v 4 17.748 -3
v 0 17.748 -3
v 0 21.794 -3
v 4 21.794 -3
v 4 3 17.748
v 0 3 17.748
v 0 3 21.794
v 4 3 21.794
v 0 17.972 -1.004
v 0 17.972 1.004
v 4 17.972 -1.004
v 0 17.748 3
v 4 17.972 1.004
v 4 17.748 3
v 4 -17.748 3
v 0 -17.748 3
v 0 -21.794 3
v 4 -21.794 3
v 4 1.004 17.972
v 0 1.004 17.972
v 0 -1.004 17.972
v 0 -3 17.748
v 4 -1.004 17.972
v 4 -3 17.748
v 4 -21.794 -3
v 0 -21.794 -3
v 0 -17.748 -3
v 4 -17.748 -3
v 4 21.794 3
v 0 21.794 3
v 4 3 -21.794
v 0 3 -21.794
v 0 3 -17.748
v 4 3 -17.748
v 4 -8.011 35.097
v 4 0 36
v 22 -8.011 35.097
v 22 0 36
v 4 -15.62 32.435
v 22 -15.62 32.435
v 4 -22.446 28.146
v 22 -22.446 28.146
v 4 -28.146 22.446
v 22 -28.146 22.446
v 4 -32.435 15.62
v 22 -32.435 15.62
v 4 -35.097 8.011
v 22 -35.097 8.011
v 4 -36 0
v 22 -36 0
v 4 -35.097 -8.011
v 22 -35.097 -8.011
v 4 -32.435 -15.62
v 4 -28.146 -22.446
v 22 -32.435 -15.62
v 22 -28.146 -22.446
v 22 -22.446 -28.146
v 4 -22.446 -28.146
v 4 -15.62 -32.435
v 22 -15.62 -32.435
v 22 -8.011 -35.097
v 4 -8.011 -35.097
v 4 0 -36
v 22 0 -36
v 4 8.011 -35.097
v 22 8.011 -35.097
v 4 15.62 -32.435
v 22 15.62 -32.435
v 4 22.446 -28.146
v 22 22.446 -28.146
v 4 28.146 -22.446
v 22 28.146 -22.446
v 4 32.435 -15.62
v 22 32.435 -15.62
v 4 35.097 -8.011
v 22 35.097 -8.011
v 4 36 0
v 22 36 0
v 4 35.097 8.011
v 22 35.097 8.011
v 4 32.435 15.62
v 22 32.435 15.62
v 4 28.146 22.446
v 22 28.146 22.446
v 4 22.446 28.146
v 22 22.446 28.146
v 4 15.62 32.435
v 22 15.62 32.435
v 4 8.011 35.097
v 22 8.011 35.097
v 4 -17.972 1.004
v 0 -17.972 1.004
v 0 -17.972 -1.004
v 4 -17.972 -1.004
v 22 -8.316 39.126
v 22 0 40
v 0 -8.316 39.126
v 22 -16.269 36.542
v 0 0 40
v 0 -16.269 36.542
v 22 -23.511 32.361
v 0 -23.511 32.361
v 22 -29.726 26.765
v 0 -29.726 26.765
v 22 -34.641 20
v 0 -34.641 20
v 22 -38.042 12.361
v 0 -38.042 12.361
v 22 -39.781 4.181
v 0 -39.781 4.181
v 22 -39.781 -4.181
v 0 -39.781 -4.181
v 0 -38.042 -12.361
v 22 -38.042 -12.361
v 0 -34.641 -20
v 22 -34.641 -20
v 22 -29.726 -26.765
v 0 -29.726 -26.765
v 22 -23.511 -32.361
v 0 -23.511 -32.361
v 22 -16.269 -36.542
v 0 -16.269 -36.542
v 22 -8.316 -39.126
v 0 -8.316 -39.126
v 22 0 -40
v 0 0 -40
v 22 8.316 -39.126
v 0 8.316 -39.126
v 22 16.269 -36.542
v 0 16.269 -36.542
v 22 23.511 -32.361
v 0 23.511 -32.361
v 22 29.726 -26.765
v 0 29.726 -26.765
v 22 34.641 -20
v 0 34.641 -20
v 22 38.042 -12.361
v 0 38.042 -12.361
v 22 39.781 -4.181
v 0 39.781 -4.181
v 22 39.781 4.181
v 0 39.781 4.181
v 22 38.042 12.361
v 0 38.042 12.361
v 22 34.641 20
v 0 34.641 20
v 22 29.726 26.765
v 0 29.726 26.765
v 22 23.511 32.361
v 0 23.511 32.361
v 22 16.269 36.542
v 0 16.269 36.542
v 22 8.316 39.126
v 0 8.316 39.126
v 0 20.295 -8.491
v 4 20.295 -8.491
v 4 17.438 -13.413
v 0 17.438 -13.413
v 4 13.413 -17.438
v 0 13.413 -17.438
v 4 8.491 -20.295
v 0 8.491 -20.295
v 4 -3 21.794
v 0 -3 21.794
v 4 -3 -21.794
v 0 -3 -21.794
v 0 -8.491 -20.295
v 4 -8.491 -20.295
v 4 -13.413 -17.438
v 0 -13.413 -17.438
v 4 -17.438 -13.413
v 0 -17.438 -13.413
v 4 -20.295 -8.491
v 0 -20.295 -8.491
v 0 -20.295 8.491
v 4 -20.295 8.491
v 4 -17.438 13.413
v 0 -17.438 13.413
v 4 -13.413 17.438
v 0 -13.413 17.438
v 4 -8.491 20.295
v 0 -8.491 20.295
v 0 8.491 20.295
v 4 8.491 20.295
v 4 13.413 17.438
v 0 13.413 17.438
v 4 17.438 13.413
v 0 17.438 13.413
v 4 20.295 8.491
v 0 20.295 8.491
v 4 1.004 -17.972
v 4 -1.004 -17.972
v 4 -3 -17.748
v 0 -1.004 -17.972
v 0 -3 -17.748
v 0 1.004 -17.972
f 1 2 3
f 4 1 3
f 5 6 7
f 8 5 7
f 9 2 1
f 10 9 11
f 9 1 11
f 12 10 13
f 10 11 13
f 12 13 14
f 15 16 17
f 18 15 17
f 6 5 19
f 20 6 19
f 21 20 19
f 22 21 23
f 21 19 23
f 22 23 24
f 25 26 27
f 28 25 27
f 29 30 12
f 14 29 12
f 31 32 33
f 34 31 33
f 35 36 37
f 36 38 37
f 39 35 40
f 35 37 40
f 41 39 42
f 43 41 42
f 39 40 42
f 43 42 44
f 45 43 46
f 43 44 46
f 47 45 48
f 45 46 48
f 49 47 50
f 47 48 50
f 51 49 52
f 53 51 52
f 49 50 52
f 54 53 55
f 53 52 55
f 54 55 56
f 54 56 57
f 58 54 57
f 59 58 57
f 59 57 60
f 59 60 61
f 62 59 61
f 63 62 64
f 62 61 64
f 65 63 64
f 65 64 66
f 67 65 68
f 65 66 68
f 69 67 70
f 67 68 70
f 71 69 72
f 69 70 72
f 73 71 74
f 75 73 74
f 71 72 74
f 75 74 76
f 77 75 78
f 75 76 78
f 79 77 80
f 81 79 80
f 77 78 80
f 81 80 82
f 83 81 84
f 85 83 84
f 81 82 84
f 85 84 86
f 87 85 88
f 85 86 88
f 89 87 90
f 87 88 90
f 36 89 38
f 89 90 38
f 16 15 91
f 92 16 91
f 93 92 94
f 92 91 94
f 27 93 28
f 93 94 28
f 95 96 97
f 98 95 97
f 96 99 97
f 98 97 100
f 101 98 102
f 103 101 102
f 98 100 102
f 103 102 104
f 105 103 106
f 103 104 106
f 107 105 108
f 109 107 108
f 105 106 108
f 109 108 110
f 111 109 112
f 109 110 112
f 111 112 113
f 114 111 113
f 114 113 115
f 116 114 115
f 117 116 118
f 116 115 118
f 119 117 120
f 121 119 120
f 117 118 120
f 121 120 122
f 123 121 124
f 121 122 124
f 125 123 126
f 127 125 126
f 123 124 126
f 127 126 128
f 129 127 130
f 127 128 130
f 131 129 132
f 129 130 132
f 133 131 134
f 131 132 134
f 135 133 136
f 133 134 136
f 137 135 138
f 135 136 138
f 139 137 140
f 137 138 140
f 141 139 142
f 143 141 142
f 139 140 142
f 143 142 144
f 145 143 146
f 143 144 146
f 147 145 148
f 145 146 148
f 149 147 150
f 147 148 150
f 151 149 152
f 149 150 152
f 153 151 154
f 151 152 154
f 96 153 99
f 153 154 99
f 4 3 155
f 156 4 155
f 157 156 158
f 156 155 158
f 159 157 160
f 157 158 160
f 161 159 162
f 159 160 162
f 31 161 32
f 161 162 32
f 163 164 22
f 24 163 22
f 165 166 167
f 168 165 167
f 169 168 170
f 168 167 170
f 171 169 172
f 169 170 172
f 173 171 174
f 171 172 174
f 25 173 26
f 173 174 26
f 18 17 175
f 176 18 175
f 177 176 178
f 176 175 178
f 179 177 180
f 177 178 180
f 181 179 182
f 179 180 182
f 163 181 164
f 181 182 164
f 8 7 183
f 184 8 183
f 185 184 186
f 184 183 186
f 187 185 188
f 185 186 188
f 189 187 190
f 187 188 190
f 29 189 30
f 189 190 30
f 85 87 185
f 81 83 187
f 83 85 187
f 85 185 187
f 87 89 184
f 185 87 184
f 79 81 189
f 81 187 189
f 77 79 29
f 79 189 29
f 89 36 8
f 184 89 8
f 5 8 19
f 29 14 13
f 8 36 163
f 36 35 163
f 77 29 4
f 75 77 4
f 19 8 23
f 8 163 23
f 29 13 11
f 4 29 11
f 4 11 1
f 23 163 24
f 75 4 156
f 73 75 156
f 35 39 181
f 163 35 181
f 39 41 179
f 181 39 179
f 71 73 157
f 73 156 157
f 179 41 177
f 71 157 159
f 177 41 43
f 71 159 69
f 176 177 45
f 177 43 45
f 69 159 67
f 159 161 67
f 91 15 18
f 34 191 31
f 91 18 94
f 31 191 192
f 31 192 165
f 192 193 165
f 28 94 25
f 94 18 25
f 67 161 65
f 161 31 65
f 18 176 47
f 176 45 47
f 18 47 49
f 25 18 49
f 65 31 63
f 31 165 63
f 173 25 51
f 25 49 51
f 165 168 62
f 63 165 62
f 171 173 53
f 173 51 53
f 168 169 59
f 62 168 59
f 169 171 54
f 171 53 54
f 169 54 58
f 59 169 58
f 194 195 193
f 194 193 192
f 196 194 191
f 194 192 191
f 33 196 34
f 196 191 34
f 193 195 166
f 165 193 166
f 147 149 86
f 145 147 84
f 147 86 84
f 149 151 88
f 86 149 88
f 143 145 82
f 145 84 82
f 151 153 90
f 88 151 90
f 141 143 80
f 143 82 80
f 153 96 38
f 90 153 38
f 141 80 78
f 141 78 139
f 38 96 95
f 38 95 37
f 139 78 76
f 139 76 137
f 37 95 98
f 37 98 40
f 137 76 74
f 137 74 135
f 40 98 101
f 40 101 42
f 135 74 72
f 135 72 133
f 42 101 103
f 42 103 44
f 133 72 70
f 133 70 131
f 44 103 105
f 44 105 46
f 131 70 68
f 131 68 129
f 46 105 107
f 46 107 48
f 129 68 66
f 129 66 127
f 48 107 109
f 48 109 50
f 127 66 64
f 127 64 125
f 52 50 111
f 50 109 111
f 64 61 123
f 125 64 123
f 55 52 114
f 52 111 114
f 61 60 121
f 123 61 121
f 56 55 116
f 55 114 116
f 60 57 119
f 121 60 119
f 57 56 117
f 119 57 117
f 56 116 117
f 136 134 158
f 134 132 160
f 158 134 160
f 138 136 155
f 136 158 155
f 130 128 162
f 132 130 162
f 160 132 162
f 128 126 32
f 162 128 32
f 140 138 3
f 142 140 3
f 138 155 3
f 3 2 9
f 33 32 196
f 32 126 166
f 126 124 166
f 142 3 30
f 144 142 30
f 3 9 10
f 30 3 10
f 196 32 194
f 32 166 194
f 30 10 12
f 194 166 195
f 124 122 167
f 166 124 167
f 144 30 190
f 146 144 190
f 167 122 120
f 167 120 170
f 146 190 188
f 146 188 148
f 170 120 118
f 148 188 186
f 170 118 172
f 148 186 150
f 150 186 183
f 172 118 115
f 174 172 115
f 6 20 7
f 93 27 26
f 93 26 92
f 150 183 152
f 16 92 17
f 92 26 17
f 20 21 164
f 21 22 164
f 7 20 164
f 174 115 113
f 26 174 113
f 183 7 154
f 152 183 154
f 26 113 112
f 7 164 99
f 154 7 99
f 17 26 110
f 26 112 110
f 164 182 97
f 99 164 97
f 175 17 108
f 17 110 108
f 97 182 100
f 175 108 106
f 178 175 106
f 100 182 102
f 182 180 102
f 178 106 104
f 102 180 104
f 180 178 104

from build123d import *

# Parameters (mm, degrees)
ENL_V_MAT_EXTRU_1_DEPTH = 61.695963622


with BuildPart() as part:
    # Esquisse1 → Base-Révolution (revolve)
    with BuildSketch(Plane.XY, mode=Mode.PRIVATE) as base_r_volution_sk:
        Polygon((0, 40), (0, 18), (4, 18), (4, 36), (22, 36), (22, 40), align=None)
    revolve(base_r_volution_sk.sketch.rotate(Axis((0, 0, 0), (1, 0, 0)), 90), axis=Axis((0, 0, 0), (1, 0, 0)))

    # Esquisse2 → Enlèv. mat.-Extru.1 (cut, through all)
    with BuildSketch(Plane.ZY):
        with BuildLine():
            Line((-3, 16), (-3, 21.794494718))
            ThreePointArc((-3, 21.794494718), (-15.556349186, 15.556349186), (-21.794494718, 3))
            Line((-21.794494718, 3), (-16, 3))
            Line((-16, 3), (-16, -3))
            Line((-16, -3), (-21.794494718, -3))
            ThreePointArc((-21.794494718, -3), (-15.556349186, -15.556349186), (-3, -21.794494718))
            Line((-3, -21.794494718), (-3, -16))
            Line((-3, -16), (3, -16))
            Line((3, -16), (3, -21.794494718))
            ThreePointArc((3, -21.794494718), (15.556349186, -15.556349186), (21.794494718, -3))
            Line((21.794494718, -3), (16, -3))
            Line((16, -3), (16, 3))
            Line((16, 3), (21.794494718, 3))
            ThreePointArc((21.794494718, 3), (15.556349186, 15.556349186), (3, 21.794494718))
            Line((3, 21.794494718), (3, 16))
            Line((3, 16), (-3, 16))
        make_face()
    extrude(amount=-ENL_V_MAT_EXTRU_1_DEPTH, mode=Mode.SUBTRACT)


solid = part.part
